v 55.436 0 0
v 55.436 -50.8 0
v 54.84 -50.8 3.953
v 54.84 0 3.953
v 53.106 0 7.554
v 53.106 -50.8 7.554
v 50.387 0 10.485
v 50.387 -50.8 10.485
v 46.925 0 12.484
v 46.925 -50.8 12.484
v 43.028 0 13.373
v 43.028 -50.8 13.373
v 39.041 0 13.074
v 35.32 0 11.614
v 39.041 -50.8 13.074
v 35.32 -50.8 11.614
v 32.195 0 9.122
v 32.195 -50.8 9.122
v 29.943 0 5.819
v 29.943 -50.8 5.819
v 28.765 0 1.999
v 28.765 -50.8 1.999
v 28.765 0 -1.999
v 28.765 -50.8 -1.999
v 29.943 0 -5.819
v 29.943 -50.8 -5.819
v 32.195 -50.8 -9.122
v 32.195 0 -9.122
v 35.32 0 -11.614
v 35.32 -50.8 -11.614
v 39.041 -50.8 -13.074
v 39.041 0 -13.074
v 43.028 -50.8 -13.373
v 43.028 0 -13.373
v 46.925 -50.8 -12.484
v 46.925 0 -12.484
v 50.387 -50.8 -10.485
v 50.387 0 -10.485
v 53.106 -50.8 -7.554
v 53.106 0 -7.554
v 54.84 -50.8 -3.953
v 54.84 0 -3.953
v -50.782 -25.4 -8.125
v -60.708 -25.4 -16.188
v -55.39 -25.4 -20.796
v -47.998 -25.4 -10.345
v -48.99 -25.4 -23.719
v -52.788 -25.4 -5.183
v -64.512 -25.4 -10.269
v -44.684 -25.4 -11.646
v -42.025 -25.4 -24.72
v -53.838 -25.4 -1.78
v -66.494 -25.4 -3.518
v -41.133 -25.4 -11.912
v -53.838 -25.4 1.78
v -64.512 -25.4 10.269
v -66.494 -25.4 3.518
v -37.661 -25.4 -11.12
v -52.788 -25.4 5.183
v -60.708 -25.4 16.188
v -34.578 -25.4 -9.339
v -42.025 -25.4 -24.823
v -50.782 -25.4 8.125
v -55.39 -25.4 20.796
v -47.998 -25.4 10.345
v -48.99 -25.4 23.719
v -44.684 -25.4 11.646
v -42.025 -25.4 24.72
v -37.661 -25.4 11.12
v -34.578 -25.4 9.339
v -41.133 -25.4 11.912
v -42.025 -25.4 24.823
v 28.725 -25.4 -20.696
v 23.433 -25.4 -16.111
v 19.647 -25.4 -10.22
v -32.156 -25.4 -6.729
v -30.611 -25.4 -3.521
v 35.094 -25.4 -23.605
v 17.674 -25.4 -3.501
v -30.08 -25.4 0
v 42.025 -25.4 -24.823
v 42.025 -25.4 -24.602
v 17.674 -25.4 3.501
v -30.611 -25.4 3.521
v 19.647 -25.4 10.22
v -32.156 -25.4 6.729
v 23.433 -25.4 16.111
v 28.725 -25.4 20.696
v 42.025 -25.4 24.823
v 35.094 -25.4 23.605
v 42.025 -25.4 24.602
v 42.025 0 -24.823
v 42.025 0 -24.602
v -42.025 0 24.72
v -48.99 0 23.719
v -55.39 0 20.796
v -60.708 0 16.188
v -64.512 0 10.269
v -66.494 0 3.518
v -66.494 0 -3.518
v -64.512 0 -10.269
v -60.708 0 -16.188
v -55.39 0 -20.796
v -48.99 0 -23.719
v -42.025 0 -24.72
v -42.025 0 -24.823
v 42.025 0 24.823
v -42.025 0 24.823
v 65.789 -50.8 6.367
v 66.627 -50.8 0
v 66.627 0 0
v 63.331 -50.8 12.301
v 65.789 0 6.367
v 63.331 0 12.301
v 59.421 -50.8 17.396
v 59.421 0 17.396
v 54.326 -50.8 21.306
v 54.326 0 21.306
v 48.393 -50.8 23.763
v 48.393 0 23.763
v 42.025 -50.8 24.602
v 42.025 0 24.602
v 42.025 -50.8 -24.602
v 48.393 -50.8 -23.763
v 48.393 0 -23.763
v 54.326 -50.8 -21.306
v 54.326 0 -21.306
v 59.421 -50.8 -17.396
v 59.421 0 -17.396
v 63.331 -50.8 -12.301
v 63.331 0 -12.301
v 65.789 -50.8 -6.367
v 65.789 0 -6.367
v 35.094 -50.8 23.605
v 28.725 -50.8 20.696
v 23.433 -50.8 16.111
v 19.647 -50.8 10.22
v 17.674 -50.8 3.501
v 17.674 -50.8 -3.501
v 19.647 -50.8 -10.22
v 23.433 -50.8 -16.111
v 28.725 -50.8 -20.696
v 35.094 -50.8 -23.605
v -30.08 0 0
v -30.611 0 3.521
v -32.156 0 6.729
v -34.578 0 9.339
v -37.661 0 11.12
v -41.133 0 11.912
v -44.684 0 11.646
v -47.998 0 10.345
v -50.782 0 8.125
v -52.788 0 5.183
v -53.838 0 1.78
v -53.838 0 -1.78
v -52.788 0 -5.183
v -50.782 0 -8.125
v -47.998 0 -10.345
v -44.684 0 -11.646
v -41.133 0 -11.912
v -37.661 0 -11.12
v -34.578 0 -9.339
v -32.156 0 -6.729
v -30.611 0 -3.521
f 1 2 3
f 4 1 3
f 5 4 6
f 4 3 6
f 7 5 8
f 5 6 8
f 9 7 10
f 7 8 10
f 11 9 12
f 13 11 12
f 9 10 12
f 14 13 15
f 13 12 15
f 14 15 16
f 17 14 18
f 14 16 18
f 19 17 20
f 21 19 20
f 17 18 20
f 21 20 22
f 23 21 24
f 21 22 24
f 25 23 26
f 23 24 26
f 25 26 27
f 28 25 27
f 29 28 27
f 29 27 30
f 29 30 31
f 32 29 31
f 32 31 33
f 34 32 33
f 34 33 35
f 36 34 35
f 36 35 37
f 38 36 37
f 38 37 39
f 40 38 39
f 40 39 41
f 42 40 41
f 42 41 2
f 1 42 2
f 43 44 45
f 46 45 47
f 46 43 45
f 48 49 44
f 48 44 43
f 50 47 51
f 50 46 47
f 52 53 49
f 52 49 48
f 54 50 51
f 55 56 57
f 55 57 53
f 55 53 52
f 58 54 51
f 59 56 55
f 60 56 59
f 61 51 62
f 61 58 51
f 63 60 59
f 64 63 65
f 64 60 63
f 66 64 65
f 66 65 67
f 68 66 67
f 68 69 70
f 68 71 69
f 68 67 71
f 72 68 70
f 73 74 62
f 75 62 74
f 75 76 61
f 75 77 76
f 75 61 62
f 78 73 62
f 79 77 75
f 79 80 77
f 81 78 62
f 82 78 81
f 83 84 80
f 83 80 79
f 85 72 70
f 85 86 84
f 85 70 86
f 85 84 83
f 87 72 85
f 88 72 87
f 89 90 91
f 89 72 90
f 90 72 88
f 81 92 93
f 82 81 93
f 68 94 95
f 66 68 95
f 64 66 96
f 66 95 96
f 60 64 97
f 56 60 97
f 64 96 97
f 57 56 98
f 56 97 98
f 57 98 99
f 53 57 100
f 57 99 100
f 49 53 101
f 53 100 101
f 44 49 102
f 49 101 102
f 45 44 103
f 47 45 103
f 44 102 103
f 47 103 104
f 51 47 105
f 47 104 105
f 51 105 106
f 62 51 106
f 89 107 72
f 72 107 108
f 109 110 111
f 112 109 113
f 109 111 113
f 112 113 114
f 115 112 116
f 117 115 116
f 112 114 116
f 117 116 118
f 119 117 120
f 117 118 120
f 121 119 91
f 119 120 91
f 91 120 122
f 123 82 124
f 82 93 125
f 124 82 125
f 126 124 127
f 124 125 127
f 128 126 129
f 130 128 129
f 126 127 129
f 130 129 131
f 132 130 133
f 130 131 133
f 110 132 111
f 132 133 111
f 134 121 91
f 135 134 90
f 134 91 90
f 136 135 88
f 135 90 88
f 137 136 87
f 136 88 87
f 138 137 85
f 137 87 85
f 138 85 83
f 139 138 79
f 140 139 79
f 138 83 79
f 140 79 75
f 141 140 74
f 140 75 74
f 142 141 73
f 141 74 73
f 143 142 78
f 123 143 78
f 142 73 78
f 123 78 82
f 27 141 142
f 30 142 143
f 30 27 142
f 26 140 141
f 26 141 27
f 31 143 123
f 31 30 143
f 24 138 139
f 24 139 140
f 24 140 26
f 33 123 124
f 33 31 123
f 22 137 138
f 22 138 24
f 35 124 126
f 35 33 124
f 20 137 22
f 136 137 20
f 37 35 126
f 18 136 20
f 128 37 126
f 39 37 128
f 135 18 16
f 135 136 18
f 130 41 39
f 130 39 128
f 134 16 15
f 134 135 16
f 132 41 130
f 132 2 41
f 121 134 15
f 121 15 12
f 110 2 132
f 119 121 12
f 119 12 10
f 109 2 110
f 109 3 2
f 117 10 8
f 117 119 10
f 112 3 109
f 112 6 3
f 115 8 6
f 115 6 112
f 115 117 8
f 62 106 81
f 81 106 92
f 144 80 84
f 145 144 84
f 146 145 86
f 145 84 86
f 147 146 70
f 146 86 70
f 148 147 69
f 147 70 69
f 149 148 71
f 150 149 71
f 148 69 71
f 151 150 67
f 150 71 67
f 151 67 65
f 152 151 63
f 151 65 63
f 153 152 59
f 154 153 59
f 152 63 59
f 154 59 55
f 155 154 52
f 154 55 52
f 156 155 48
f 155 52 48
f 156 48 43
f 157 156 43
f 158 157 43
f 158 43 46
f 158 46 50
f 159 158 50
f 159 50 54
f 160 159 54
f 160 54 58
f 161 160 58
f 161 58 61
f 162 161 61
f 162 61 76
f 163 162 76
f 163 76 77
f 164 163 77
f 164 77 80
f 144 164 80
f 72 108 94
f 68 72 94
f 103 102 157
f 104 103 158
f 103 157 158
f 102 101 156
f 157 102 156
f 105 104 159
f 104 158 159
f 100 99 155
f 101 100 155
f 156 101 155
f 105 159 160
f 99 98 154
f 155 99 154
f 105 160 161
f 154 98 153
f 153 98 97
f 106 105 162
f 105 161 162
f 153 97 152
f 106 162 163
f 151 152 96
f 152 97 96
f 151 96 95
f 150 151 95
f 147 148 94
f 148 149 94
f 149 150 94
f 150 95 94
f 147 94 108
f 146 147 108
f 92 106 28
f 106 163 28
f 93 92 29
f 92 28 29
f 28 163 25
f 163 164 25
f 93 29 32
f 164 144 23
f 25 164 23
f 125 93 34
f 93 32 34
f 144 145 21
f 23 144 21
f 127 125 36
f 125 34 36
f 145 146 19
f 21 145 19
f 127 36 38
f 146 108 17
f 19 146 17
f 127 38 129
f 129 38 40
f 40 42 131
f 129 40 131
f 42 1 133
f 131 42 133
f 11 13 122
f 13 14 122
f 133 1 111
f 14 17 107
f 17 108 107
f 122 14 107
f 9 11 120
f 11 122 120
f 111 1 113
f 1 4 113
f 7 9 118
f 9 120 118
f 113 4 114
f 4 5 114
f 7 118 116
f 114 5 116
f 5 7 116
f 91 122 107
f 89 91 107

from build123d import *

# Parameters (mm, degrees)
F3_DEPTH = 50.8
F4_DEPTH = 25.4
F5_R     = 11.945502
F6_DEPTH = 25.401
F7_R     = 13.410592
F8_DEPTH = 50.801


with BuildPart() as f3:
    # F2 (on face) → F3 (new body)
    with BuildSketch(Plane.XZ):
        with BuildLine():
            Line((42.025454, -24.601573), (42.025454, 24.601573))
            ThreePointArc((42.025454, 24.601573), (17.423881, 0), (42.025454, -24.601573))
        make_face()
        with BuildLine():
            ThreePointArc((42.025454, -24.601573), (59.421394, -17.395939), (66.627028, 0))
            ThreePointArc((66.627028, 0), (59.421394, 17.395939), (42.025454, 24.601573))
            Line((42.025454, 24.601573), (42.025454, -24.601573))
        make_face()
    extrude(amount=F3_DEPTH)

    # F1 (on face) → F4 (join)
    with BuildSketch(Plane.XZ):
        with BuildLine():
            ThreePointArc((-42.025454, 24.720491), (-24.545428, 17.480027), (-17.304963, 0))
            ThreePointArc((-17.304963, 0), (-24.545428, -17.480027), (-42.025454, -24.720491))
            Line((-42.025454, -24.720491), (-42.025454, -24.822727))
            Line((-42.025454, -24.822727), (42.025454, -24.822727))
            Line((42.025454, -24.822727), (42.025454, 24.822727))
            Line((42.025454, 24.822727), (-42.025454, 24.822727))
            Line((-42.025454, 24.822727), (-42.025454, 24.720491))
        make_face()
        with BuildLine():
            Line((-42.025454, -24.720491), (-42.025454, 24.720491))
            ThreePointArc((-42.025454, 24.720491), (-66.745945, 0), (-42.025454, -24.720491))
        make_face()
        with BuildLine():
            ThreePointArc((-42.025454, -24.720491), (-24.545428, -17.480027), (-17.304963, 0))
            ThreePointArc((-17.304963, 0), (-24.545428, 17.480027), (-42.025454, 24.720491))
            Line((-42.025454, 24.720491), (-42.025454, -24.720491))
        make_face()
    extrude(amount=F4_DEPTH)

    # F5 (on face) → F6 (cut, through all)
    with BuildSketch(Plane.XZ.offset(25.4)):
        with Locations((-42.025454, 0)):
            Circle(F5_R)
    extrude(amount=-F6_DEPTH, mode=Mode.SUBTRACT)

    # F7 (on face) → F8 (cut, through all)
    with BuildSketch(Plane.XZ.offset(50.8)):
        with Locations((42.025454, 0)):
            Circle(F7_R)
    extrude(amount=-F8_DEPTH, mode=Mode.SUBTRACT)


solid = f3.part
